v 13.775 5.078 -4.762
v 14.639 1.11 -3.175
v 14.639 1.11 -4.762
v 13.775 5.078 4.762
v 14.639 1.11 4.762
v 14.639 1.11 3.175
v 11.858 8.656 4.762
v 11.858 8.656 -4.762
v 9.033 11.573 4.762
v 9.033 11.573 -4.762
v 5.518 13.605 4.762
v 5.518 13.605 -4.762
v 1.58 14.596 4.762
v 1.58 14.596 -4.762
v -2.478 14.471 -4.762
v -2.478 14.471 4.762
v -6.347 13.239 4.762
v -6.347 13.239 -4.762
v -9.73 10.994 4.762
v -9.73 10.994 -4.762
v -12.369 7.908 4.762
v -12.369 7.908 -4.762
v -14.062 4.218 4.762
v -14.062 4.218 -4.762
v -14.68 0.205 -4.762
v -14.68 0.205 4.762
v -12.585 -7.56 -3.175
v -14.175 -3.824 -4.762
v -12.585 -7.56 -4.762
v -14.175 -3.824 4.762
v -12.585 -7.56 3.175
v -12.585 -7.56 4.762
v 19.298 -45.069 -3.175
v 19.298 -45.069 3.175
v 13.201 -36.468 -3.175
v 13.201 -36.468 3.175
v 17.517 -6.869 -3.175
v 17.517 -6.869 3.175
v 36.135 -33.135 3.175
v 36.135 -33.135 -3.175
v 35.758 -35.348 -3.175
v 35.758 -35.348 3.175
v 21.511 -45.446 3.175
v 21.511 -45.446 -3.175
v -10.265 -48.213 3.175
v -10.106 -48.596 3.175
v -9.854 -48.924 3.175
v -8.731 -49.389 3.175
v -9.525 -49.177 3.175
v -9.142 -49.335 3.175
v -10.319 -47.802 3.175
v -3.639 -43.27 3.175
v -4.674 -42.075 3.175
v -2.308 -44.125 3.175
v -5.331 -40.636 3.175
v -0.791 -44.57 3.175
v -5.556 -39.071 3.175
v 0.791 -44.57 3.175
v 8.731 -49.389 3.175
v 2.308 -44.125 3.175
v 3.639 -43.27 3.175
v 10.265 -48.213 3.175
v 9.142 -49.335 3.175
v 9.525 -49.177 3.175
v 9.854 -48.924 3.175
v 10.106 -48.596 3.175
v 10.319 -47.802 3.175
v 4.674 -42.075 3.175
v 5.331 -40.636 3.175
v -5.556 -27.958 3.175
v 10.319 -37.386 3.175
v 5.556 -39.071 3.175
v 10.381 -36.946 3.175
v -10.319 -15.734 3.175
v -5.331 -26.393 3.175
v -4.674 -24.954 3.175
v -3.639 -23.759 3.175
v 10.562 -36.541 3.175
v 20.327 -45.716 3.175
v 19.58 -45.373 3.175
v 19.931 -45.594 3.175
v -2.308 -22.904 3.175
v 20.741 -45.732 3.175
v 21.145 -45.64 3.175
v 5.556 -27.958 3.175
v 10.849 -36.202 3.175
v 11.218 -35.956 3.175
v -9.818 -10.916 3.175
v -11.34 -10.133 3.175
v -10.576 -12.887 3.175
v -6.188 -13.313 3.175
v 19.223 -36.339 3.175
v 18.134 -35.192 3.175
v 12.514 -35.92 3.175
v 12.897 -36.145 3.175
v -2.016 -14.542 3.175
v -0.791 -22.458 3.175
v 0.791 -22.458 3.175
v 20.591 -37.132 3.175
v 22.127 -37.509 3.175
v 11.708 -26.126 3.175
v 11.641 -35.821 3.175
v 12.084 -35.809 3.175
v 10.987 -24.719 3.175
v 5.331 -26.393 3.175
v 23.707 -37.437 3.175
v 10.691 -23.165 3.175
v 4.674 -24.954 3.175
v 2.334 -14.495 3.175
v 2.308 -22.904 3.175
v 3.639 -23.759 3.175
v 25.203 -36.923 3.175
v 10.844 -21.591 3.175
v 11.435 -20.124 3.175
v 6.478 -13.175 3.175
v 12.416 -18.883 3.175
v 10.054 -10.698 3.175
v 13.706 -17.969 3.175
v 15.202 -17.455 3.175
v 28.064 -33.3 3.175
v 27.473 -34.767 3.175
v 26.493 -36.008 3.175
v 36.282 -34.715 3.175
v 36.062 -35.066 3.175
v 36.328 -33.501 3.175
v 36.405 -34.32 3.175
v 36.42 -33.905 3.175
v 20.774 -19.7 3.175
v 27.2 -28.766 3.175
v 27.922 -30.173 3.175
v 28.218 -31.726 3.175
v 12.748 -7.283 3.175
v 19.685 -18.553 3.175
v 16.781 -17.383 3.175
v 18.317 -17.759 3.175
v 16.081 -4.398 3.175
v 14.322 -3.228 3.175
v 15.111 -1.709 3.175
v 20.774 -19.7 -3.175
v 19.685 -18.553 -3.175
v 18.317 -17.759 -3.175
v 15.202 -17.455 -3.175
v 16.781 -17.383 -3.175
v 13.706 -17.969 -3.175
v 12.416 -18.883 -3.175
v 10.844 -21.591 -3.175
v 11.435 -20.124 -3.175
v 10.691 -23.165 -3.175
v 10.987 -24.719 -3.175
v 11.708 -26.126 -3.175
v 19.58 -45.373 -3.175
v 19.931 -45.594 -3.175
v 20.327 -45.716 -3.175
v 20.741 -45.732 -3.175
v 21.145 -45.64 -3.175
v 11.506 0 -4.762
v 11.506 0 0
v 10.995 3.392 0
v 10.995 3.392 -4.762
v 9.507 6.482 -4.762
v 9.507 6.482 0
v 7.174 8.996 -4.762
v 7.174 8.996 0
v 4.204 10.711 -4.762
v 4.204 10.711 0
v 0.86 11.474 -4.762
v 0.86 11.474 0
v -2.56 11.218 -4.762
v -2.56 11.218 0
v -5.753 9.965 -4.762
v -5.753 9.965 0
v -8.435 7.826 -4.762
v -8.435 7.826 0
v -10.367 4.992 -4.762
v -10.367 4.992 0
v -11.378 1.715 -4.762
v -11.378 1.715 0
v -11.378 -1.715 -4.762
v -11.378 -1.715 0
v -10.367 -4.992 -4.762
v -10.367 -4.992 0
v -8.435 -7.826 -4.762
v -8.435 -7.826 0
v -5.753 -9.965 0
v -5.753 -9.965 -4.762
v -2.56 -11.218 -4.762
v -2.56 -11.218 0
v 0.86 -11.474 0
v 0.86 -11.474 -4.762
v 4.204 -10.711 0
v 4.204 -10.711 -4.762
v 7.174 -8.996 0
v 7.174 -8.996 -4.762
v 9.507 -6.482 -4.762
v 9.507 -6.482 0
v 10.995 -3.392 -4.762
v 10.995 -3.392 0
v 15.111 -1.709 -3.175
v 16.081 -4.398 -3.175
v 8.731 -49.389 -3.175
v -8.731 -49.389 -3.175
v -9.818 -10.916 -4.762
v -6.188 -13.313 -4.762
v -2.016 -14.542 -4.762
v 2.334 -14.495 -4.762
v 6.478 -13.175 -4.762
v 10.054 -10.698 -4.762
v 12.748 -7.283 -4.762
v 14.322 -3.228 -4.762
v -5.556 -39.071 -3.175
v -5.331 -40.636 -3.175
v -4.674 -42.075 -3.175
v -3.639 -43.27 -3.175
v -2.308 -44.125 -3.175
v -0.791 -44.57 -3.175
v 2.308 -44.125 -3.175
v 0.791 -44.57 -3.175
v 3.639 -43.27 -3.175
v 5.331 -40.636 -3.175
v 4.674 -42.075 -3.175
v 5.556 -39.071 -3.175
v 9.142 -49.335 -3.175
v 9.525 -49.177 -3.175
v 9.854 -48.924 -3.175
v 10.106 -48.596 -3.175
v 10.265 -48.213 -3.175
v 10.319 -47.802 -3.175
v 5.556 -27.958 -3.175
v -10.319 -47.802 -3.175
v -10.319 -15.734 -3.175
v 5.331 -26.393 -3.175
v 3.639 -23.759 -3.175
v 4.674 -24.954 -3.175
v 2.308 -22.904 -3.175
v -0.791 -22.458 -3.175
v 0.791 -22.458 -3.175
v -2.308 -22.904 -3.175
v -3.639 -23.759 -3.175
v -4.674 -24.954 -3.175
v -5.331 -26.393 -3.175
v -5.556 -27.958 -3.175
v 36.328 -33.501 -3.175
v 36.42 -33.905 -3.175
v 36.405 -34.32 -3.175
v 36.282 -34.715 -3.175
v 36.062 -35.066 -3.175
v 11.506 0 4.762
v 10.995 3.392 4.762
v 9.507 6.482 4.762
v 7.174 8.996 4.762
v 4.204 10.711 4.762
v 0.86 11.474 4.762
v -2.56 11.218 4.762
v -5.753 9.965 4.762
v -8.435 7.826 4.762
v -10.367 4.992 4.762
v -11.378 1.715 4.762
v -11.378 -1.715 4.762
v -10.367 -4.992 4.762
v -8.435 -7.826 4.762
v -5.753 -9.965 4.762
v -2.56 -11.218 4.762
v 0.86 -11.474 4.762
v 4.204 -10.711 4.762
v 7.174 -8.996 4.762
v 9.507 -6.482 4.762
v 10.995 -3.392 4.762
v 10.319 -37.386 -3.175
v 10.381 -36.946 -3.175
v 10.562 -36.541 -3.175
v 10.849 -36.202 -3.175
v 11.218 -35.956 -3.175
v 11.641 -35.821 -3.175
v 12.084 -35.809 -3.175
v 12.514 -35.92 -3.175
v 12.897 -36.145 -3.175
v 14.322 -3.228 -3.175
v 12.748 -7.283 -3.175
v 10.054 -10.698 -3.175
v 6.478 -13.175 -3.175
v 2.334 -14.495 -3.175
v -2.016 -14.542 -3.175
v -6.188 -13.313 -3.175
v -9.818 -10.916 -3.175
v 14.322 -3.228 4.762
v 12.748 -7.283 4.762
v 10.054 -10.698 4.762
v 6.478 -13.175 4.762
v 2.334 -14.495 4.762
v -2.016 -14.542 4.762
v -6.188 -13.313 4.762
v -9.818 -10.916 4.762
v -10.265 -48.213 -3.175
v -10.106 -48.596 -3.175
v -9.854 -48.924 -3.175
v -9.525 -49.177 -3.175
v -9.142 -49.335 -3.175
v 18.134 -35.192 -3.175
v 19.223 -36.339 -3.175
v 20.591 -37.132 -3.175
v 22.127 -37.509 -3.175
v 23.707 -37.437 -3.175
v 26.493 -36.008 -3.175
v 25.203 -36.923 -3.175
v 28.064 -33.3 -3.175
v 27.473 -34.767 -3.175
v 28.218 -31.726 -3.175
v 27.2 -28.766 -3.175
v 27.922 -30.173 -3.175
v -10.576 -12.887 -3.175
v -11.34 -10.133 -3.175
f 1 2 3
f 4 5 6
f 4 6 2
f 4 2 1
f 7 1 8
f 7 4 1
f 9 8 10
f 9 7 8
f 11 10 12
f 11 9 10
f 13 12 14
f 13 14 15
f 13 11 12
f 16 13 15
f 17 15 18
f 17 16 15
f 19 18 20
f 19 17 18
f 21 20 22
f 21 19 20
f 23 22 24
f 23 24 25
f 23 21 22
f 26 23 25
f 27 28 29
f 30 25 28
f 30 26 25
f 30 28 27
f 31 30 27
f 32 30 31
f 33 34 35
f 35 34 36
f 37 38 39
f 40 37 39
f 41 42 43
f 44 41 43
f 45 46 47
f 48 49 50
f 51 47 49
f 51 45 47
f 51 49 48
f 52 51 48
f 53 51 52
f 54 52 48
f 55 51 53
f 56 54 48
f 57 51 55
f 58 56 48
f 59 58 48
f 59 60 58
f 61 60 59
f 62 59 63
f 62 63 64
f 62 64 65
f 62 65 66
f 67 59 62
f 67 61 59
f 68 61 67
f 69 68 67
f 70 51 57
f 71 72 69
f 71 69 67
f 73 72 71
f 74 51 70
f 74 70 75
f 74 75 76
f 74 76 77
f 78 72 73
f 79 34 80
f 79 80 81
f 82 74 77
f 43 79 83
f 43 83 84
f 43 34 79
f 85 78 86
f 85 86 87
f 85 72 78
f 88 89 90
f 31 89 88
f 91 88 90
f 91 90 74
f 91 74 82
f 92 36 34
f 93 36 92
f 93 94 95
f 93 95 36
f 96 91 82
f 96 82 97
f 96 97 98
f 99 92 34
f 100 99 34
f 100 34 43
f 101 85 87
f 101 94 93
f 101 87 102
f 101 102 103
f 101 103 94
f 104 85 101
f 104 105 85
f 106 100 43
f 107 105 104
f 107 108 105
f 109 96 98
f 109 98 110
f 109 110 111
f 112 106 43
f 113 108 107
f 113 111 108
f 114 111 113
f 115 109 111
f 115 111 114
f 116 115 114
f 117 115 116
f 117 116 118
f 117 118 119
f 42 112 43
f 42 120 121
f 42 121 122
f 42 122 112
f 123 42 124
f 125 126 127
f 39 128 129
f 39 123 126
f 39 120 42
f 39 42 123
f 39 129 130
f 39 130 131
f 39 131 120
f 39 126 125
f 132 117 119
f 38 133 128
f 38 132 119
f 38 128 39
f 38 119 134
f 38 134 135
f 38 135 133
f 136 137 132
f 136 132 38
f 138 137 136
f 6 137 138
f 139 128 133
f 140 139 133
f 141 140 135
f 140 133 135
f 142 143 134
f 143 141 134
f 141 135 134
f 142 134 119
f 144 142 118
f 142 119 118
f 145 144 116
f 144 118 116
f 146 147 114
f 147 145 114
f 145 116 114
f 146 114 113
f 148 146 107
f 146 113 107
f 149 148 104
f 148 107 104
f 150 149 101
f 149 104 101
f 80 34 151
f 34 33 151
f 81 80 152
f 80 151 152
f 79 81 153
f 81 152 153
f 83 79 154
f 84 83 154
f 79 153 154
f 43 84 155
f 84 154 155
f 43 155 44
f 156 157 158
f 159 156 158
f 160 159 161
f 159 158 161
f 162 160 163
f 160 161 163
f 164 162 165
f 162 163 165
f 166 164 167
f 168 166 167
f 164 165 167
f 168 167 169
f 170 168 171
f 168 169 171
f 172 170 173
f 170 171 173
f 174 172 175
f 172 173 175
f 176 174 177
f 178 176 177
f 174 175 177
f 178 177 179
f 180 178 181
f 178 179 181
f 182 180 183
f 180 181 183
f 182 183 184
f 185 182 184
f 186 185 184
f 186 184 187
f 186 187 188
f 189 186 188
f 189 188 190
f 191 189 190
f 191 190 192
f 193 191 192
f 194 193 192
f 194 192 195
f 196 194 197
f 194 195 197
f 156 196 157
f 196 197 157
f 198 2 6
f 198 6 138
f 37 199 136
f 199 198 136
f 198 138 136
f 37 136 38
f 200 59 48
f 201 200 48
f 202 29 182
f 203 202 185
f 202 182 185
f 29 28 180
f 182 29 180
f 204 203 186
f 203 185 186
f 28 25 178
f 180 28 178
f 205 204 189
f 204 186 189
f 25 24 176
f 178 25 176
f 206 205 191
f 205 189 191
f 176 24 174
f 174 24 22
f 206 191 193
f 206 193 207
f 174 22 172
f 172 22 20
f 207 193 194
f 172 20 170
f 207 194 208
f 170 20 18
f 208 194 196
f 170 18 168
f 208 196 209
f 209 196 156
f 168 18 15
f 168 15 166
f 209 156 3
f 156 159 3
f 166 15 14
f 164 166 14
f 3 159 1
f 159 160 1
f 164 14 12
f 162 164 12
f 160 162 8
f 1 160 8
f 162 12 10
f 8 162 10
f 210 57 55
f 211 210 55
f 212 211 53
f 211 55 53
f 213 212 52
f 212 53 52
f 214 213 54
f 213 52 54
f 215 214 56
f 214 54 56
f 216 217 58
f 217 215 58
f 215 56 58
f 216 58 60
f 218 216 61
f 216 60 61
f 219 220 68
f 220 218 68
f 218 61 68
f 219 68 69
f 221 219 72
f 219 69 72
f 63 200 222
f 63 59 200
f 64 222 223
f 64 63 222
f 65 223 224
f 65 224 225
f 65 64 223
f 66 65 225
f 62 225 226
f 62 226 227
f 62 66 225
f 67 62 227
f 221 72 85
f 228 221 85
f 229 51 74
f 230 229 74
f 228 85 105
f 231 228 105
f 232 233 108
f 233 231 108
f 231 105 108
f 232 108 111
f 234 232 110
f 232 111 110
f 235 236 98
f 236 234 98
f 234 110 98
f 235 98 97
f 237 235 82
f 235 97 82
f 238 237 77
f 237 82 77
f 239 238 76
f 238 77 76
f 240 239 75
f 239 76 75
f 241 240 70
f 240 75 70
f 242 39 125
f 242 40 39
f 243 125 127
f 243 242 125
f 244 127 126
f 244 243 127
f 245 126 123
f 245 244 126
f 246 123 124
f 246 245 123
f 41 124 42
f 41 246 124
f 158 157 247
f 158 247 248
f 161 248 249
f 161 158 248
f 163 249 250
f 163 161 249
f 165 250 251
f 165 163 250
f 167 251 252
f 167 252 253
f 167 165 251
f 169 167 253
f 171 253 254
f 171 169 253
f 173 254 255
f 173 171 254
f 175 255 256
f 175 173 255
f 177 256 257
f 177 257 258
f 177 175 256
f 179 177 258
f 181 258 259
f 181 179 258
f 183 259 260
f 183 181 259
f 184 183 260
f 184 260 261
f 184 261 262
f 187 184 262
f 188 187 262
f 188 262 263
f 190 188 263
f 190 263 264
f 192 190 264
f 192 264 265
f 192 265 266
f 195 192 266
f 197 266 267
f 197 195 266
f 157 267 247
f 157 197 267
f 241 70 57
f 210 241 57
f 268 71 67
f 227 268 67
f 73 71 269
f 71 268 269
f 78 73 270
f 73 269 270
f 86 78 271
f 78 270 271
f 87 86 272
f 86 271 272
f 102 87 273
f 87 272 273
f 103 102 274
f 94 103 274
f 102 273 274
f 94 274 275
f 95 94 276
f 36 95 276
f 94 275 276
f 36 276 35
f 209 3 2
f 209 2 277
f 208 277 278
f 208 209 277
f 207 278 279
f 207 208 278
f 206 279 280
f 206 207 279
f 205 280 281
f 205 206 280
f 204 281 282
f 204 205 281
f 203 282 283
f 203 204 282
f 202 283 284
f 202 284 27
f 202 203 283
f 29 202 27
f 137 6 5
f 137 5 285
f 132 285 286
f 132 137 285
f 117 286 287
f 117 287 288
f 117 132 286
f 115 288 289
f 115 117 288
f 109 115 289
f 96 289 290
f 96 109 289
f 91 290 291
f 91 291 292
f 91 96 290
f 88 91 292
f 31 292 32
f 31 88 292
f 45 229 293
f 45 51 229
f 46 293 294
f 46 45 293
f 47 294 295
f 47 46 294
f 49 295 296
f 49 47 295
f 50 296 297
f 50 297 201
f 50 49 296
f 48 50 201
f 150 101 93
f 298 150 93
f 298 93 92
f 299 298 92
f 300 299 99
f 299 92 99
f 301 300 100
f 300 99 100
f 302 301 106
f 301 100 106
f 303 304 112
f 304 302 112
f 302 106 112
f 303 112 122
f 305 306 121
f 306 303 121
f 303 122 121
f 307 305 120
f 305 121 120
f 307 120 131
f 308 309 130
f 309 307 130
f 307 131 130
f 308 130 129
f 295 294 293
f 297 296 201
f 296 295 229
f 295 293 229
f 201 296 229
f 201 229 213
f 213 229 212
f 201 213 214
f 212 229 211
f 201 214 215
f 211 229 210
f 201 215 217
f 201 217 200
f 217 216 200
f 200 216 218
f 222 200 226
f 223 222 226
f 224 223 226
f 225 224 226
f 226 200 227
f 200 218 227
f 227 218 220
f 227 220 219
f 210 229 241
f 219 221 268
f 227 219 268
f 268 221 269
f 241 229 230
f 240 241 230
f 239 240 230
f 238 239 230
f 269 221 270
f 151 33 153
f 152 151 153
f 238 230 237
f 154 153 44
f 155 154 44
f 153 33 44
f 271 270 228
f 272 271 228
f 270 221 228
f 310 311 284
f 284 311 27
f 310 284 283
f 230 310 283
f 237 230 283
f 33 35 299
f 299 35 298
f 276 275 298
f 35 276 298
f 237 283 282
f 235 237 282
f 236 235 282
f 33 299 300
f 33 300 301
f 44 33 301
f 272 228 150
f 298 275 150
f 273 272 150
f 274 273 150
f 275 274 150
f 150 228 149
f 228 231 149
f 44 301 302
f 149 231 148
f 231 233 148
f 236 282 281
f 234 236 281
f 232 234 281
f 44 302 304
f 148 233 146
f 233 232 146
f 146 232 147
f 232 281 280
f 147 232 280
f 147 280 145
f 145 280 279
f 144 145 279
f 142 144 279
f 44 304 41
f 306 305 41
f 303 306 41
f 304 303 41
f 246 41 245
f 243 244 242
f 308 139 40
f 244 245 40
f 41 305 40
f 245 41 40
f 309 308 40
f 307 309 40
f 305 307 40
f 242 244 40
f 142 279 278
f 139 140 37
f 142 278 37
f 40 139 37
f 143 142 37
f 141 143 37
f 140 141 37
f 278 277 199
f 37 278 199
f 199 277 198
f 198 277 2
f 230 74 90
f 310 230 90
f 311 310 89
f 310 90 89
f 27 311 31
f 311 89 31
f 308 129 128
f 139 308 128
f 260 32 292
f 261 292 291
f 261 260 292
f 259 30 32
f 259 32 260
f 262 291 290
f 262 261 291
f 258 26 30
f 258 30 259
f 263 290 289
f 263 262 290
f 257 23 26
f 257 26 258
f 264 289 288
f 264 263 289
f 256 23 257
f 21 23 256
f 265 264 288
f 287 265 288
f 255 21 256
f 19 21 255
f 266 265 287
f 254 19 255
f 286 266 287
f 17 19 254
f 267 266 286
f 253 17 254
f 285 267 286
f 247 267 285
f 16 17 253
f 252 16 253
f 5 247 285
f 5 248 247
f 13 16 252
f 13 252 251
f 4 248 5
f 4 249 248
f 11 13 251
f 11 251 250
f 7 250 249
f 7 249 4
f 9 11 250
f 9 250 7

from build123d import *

# Parameters (mm, degrees)
SKETCH1_R                = 11.5062
BOSS_EXTRUDE1_DEPTH      = 4.7625
BOSS_EXTRUDE1_DEPTH_BACK = 4.7625
CUT_EXTRUDE1_START       = -4.7625
CUT_EXTRUDE1_DEPTH       = 1.5875
CUT_EXTRUDE2_START       = 3.175
CUT_EXTRUDE2_DEPTH       = 1.5875
FILLET1_R                = 1.5875


with BuildPart() as part:
    # Sketch1 → Boss-Extrude1 (new body, two sides)
    with BuildSketch(Plane.XY) as boss_extrude1_sk:
        with BuildLine():
            ThreePointArc((14.639156809, 1.110279863), (-4.45502565, 13.988937769), (-12.585193267, -7.559797873))
            ThreePointArc((-12.585193267, -7.559797873), (4.45502565, -13.988937769), (14.639156809, 1.110279863))
        make_face()
        Circle(SKETCH1_R, mode=Mode.SUBTRACT)
        with BuildLine():
            ThreePointArc((-12.585193267, -7.559797873), (4.45502565, -13.988937769), (14.639156809, 1.110279863))
            ThreePointArc((14.639156809, 1.110279863), (15.535368252, -3.075379389), (17.517315641, -6.869430374))
            Line((17.517315641, -6.869430374), (37.052935248, -34.429965394))
            Line((37.052935248, -34.429965394), (20.216142238, -46.364319477))
            Line((20.216142238, -46.364319477), (10.31875, -32.401239172))
            Line((10.31875, -32.401239172), (10.31875, -49.389319794))
            Line((10.31875, -49.389319794), (-10.31875, -49.389319794))
            Line((-10.31875, -49.389319794), (-10.31875, -15.734319794))
            ThreePointArc((-10.31875, -15.734319794), (-10.89585042, -11.492870345), (-12.585193267, -7.559797873))
        make_face()
        with BuildLine():
            ThreePointArc((20.774153775, -19.699685133), (13.028075711, -18.379797729), (11.708188308, -26.125875793))
            Line((11.708188308, -26.125875793), (18.134378968, -35.19184126))
            ThreePointArc((18.134378968, -35.19184126), (25.880457031, -36.511728663), (27.200344435, -28.7656506))
            Line((27.200344435, -28.7656506), (20.774153775, -19.699685133))
        make_face(mode=Mode.SUBTRACT)
        with BuildLine():
            ThreePointArc((5.55625, -27.958069794), (0, -22.401819794), (-5.55625, -27.958069794))
            Line((-5.55625, -27.958069794), (-5.55625, -39.070569794))
            ThreePointArc((-5.55625, -39.070569794), (0, -44.626819794), (5.55625, -39.070569794))
            Line((5.55625, -39.070569794), (5.55625, -27.958069794))
        make_face(mode=Mode.SUBTRACT)
    extrude(amount=BOSS_EXTRUDE1_DEPTH)
    extrude(boss_extrude1_sk.sketch, amount=-BOSS_EXTRUDE1_DEPTH_BACK)

    # Sketch2 → Cut-Extrude1 (cut)
    with BuildSketch(Plane.XY.offset(CUT_EXTRUDE1_START)):
        with BuildLine():
            Line((-10.31875, -15.734319794), (-10.31875, -49.389319794))
            Line((-10.31875, -49.389319794), (10.31875, -49.389319794))
            Line((10.31875, -49.389319794), (10.31875, -32.401239172))
            Line((10.31875, -32.401239172), (20.216142238, -46.364319477))
            Line((20.216142238, -46.364319477), (37.052935248, -34.429965394))
            Line((37.052935248, -34.429965394), (17.517315641, -6.869430374))
            ThreePointArc((17.517315641, -6.869430374), (15.535368252, -3.075379389), (14.639156809, 1.110279863))
            ThreePointArc((14.639156809, 1.110279863), (4.45502565, -13.988937769), (-12.585193267, -7.559797873))
            ThreePointArc((-12.585193267, -7.559797873), (-10.89585042, -11.492870345), (-10.31875, -15.734319794))
        make_face()
        with BuildLine():
            Line((-5.55625, -39.070569794), (-5.55625, -27.958069794))
            ThreePointArc((-5.55625, -27.958069794), (0, -22.401819794), (5.55625, -27.958069794))
            Line((5.55625, -27.958069794), (5.55625, -39.070569794))
            ThreePointArc((5.55625, -39.070569794), (0, -44.626819794), (-5.55625, -39.070569794))
        make_face(mode=Mode.SUBTRACT)
        with BuildLine():
            Line((18.134378968, -35.19184126), (11.708188308, -26.125875793))
            ThreePointArc((11.708188308, -26.125875793), (13.028075711, -18.379797729), (20.774153775, -19.699685133))
            Line((20.774153775, -19.699685133), (27.200344435, -28.7656506))
            ThreePointArc((27.200344435, -28.7656506), (25.880457031, -36.511728663), (18.134378968, -35.19184126))
        make_face(mode=Mode.SUBTRACT)
    extrude(amount=CUT_EXTRUDE1_DEPTH, mode=Mode.SUBTRACT)

    # Sketch2_6 → Cut-Extrude2 (cut)
    with BuildSketch(Plane.XY.offset(CUT_EXTRUDE2_START)):
        with BuildLine():
            Line((-10.31875, -15.734319794), (-10.31875, -49.389319794))
            Line((-10.31875, -49.389319794), (10.31875, -49.389319794))
            Line((10.31875, -49.389319794), (10.31875, -32.401239172))
            Line((10.31875, -32.401239172), (20.216142238, -46.364319477))
            Line((20.216142238, -46.364319477), (37.052935248, -34.429965394))
            Line((37.052935248, -34.429965394), (17.517315641, -6.869430374))
            ThreePointArc((17.517315641, -6.869430374), (15.535368252, -3.075379389), (14.639156809, 1.110279863))
            ThreePointArc((14.639156809, 1.110279863), (4.45502565, -13.988937769), (-12.585193267, -7.559797873))
            ThreePointArc((-12.585193267, -7.559797873), (-10.89585042, -11.492870345), (-10.31875, -15.734319794))
        make_face()
        with BuildLine():
            Line((-5.55625, -39.070569794), (-5.55625, -27.958069794))
            ThreePointArc((-5.55625, -27.958069794), (0, -22.401819794), (5.55625, -27.958069794))
            Line((5.55625, -27.958069794), (5.55625, -39.070569794))
            ThreePointArc((5.55625, -39.070569794), (0, -44.626819794), (-5.55625, -39.070569794))
        make_face(mode=Mode.SUBTRACT)
        with BuildLine():
            Line((18.134378968, -35.19184126), (11.708188308, -26.125875793))
            ThreePointArc((11.708188308, -26.125875793), (13.028075711, -18.379797729), (20.774153775, -19.699685133))
            Line((20.774153775, -19.699685133), (27.200344435, -28.7656506))
            ThreePointArc((27.200344435, -28.7656506), (25.880457031, -36.511728663), (18.134378968, -35.19184126))
        make_face(mode=Mode.SUBTRACT)
    extrude(amount=CUT_EXTRUDE2_DEPTH, mode=Mode.SUBTRACT)

    # Fillet1
    fillet1_edges = [part.edges().sort_by_distance(p)[0] for p in [
        (-10.31875, -49.389319794, 0),
        (10.31875, -49.389319794, 0),
        (10.31875, -32.401239172, 0),
        (20.216142238, -46.364319477, 0),
        (37.052935248, -34.429965394, 0),
    ]]
    fillet(fillet1_edges, radius=FILLET1_R)


solid = part.part
